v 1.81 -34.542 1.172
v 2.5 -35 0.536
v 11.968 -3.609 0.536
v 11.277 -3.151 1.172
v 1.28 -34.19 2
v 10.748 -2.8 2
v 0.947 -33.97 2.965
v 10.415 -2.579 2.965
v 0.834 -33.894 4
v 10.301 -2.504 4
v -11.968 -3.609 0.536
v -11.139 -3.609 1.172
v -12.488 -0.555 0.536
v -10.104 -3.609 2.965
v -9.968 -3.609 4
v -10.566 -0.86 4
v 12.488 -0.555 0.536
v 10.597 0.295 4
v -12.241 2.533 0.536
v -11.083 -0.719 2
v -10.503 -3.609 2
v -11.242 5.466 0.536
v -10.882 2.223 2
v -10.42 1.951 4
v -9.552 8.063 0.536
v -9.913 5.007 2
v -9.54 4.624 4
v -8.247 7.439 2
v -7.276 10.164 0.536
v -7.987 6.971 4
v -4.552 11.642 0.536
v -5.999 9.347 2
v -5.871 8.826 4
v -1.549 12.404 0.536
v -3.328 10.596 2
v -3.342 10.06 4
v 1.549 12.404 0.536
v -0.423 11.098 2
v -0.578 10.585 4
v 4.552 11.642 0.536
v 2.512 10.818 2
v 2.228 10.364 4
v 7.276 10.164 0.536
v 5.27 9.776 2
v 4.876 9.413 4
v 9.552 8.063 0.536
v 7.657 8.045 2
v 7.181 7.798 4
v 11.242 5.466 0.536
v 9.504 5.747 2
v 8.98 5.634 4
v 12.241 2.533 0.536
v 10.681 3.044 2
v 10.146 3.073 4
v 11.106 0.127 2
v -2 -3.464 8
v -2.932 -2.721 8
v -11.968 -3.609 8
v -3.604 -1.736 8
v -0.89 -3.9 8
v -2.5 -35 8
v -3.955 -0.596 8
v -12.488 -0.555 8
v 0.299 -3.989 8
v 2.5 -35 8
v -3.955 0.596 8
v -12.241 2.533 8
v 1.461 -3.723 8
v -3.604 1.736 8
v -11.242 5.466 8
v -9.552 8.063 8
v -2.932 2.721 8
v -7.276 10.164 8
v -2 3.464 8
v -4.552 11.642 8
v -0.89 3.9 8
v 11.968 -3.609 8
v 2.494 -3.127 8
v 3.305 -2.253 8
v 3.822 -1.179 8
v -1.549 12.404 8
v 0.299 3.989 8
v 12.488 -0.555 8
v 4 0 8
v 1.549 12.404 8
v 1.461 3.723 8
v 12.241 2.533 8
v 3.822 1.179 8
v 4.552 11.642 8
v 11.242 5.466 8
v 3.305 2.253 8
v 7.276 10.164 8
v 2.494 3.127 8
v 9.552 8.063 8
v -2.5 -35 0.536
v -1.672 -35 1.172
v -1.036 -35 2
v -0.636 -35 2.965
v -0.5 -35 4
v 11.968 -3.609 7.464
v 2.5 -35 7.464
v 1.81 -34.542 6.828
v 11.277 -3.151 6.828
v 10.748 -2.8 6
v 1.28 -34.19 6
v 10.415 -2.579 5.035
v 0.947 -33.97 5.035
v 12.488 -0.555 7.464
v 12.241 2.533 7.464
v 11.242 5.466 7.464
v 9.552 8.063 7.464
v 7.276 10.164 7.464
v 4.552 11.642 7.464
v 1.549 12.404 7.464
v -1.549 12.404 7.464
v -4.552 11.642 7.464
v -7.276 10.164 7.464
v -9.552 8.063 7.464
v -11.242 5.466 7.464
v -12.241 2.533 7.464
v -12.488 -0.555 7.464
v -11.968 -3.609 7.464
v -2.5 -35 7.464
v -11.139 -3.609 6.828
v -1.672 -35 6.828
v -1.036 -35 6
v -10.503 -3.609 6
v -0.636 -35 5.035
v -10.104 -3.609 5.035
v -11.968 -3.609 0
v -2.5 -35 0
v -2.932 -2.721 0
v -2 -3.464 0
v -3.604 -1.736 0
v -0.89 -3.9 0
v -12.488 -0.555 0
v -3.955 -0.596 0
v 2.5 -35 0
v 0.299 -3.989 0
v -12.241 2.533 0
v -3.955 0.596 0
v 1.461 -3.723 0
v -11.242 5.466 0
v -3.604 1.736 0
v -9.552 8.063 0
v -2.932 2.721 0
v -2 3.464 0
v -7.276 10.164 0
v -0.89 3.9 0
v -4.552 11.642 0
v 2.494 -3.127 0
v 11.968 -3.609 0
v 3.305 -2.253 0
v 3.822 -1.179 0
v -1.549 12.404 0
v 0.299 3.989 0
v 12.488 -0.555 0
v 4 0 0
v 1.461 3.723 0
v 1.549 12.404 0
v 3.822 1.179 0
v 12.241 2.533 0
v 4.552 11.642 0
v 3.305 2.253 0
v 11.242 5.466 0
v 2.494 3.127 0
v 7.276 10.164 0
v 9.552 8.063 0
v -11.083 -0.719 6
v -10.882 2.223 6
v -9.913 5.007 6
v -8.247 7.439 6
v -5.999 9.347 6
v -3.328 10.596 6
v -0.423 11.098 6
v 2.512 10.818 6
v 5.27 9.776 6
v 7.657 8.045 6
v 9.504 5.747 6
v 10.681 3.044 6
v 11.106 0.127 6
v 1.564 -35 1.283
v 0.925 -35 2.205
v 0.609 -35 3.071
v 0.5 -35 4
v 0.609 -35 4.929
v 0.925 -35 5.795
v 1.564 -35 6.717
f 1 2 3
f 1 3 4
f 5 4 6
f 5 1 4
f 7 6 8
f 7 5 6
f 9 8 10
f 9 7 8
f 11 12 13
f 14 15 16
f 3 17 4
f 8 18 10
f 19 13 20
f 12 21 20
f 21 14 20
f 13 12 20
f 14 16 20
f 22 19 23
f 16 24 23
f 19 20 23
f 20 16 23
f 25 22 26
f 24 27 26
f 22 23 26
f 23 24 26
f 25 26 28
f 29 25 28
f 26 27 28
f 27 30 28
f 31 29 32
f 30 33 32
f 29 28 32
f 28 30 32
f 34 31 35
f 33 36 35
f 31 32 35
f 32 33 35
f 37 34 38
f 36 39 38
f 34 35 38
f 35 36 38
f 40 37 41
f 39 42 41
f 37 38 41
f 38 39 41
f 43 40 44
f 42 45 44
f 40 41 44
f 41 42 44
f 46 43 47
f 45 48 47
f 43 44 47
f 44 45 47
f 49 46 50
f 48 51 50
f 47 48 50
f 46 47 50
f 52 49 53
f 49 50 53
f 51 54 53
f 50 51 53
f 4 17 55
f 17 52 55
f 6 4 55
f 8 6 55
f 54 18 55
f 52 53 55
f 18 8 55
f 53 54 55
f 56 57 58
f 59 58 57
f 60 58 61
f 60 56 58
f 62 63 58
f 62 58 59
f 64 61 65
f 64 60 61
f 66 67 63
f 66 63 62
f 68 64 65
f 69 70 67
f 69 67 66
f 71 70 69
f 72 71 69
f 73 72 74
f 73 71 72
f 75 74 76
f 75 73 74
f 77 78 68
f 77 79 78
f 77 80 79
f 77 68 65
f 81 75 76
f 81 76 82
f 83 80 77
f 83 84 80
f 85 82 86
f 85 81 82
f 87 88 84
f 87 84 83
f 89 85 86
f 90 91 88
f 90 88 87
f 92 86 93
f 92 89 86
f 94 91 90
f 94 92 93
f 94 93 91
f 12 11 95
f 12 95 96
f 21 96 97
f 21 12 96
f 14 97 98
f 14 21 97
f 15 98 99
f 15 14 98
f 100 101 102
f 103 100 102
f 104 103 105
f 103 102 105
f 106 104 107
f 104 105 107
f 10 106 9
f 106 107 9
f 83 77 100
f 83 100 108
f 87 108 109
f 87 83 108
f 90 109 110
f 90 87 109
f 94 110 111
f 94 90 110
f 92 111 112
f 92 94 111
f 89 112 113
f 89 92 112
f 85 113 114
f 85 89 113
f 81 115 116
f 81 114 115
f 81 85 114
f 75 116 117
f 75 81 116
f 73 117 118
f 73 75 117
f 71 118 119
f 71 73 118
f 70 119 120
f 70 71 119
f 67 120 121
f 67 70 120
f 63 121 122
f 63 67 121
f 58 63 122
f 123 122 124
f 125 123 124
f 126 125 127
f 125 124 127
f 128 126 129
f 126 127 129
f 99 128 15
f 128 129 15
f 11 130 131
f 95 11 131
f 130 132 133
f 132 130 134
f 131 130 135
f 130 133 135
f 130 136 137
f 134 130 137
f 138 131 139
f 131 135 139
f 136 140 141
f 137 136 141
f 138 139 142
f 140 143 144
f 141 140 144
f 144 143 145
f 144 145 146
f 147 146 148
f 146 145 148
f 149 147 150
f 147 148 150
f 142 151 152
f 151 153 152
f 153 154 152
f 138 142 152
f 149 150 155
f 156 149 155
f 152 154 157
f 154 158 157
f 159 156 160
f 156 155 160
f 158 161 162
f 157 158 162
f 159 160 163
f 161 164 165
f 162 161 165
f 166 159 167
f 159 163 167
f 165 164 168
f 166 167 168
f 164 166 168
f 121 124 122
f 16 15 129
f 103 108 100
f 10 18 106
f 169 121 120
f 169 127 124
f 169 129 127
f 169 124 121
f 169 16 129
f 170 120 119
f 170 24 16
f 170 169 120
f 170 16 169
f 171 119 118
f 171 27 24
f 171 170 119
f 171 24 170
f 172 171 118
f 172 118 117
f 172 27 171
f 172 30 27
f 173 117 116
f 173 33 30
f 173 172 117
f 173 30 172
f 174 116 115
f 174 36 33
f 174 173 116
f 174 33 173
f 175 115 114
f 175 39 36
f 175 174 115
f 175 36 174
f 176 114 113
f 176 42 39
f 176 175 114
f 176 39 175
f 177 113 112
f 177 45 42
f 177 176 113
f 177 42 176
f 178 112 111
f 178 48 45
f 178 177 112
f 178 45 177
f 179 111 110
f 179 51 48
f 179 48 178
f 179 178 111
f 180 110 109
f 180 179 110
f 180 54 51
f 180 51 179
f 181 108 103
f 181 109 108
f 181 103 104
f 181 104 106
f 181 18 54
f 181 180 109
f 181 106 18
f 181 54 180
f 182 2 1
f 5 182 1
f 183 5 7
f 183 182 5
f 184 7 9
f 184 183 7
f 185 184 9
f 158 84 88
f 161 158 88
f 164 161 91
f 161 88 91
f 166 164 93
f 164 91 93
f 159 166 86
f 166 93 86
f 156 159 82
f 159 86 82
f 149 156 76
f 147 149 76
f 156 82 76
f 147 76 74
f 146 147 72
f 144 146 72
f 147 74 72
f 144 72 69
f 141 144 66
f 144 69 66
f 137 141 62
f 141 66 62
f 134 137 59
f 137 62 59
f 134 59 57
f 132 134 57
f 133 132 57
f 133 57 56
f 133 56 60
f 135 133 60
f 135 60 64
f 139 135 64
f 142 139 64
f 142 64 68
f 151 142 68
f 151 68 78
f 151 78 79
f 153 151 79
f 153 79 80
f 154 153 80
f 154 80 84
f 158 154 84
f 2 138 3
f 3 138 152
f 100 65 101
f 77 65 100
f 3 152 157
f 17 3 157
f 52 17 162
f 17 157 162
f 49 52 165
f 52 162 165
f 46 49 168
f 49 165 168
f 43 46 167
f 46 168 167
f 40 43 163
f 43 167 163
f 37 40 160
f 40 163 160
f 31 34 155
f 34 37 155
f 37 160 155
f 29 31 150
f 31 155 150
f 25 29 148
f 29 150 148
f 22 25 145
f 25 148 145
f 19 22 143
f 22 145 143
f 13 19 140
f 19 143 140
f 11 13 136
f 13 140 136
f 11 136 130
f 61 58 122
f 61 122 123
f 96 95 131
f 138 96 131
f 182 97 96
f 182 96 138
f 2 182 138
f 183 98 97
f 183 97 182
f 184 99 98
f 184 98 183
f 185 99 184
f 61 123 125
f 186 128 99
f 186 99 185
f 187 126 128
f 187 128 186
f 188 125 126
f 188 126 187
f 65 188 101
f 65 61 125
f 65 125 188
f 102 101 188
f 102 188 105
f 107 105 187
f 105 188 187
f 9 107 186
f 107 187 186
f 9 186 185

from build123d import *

# Parameters (mm, degrees)
F0_R     = 4
F1_DEPTH = 4


with BuildPart() as f1:
    # F0 (on Top) → F1 (new body)
    with BuildSketch(Plane.XY):
        with BuildLine():
            Line((2.5, -35), (11.9675303731, -3.6094621162))
            ThreePointArc((11.9675303731, -3.6094621162), (0, 12.5), (-11.9675303731, -3.6094621162))
            Line((-11.9675303731, -3.6094621162), (-2.5, -35))
            Line((-2.5, -35), (2.5, -35))
        make_face()
        Circle(F0_R, mode=Mode.SUBTRACT)
    extrude(amount=F1_DEPTH)

    # F4: sweep along a path in F4_path
    with BuildLine(Plane(origin=(-11.9675303731, -3.6094621162, 4), x_dir=(0, 1, 0), z_dir=(0, 0, 1))) as f4_path:
        Line((-31.3905378838, -9.4675303731), (0, 0))
        ThreePointArc((0, 0), (16.1094621162, -11.9675303731), (0, -23.9350607463))
        Line((0, -23.9350607463), (-31.3905378838, -14.4675303731))
        Line((-31.3905378838, -14.4675303731), (-38.5466098599, -12.309226204))
    # F3 (on face) → F4 (sweep, cut)
    with BuildSketch(Plane.XZ.offset(35)):
        with BuildLine():
            ThreePointArc((-2.5, 0.5358983849), (-1.0358983849, 2), (-0.5, 4))
            Line((-0.5, 4), (-2.5, 4))
            Line((-2.5, 4), (-2.5, 0.5358983849))
        make_face()
    sweep(path=f4_path.line, mode=Mode.SUBTRACT)

    # F5: F1 across face


with BuildPart() as f1_1:
    add(f1.part)
    add(f1.part.mirror(Plane(origin=(-0.0002320259, -7.7910771971, 4), x_dir=(1, 0, 0), z_dir=(0, 0, 1))))


solid = f1_1.part
